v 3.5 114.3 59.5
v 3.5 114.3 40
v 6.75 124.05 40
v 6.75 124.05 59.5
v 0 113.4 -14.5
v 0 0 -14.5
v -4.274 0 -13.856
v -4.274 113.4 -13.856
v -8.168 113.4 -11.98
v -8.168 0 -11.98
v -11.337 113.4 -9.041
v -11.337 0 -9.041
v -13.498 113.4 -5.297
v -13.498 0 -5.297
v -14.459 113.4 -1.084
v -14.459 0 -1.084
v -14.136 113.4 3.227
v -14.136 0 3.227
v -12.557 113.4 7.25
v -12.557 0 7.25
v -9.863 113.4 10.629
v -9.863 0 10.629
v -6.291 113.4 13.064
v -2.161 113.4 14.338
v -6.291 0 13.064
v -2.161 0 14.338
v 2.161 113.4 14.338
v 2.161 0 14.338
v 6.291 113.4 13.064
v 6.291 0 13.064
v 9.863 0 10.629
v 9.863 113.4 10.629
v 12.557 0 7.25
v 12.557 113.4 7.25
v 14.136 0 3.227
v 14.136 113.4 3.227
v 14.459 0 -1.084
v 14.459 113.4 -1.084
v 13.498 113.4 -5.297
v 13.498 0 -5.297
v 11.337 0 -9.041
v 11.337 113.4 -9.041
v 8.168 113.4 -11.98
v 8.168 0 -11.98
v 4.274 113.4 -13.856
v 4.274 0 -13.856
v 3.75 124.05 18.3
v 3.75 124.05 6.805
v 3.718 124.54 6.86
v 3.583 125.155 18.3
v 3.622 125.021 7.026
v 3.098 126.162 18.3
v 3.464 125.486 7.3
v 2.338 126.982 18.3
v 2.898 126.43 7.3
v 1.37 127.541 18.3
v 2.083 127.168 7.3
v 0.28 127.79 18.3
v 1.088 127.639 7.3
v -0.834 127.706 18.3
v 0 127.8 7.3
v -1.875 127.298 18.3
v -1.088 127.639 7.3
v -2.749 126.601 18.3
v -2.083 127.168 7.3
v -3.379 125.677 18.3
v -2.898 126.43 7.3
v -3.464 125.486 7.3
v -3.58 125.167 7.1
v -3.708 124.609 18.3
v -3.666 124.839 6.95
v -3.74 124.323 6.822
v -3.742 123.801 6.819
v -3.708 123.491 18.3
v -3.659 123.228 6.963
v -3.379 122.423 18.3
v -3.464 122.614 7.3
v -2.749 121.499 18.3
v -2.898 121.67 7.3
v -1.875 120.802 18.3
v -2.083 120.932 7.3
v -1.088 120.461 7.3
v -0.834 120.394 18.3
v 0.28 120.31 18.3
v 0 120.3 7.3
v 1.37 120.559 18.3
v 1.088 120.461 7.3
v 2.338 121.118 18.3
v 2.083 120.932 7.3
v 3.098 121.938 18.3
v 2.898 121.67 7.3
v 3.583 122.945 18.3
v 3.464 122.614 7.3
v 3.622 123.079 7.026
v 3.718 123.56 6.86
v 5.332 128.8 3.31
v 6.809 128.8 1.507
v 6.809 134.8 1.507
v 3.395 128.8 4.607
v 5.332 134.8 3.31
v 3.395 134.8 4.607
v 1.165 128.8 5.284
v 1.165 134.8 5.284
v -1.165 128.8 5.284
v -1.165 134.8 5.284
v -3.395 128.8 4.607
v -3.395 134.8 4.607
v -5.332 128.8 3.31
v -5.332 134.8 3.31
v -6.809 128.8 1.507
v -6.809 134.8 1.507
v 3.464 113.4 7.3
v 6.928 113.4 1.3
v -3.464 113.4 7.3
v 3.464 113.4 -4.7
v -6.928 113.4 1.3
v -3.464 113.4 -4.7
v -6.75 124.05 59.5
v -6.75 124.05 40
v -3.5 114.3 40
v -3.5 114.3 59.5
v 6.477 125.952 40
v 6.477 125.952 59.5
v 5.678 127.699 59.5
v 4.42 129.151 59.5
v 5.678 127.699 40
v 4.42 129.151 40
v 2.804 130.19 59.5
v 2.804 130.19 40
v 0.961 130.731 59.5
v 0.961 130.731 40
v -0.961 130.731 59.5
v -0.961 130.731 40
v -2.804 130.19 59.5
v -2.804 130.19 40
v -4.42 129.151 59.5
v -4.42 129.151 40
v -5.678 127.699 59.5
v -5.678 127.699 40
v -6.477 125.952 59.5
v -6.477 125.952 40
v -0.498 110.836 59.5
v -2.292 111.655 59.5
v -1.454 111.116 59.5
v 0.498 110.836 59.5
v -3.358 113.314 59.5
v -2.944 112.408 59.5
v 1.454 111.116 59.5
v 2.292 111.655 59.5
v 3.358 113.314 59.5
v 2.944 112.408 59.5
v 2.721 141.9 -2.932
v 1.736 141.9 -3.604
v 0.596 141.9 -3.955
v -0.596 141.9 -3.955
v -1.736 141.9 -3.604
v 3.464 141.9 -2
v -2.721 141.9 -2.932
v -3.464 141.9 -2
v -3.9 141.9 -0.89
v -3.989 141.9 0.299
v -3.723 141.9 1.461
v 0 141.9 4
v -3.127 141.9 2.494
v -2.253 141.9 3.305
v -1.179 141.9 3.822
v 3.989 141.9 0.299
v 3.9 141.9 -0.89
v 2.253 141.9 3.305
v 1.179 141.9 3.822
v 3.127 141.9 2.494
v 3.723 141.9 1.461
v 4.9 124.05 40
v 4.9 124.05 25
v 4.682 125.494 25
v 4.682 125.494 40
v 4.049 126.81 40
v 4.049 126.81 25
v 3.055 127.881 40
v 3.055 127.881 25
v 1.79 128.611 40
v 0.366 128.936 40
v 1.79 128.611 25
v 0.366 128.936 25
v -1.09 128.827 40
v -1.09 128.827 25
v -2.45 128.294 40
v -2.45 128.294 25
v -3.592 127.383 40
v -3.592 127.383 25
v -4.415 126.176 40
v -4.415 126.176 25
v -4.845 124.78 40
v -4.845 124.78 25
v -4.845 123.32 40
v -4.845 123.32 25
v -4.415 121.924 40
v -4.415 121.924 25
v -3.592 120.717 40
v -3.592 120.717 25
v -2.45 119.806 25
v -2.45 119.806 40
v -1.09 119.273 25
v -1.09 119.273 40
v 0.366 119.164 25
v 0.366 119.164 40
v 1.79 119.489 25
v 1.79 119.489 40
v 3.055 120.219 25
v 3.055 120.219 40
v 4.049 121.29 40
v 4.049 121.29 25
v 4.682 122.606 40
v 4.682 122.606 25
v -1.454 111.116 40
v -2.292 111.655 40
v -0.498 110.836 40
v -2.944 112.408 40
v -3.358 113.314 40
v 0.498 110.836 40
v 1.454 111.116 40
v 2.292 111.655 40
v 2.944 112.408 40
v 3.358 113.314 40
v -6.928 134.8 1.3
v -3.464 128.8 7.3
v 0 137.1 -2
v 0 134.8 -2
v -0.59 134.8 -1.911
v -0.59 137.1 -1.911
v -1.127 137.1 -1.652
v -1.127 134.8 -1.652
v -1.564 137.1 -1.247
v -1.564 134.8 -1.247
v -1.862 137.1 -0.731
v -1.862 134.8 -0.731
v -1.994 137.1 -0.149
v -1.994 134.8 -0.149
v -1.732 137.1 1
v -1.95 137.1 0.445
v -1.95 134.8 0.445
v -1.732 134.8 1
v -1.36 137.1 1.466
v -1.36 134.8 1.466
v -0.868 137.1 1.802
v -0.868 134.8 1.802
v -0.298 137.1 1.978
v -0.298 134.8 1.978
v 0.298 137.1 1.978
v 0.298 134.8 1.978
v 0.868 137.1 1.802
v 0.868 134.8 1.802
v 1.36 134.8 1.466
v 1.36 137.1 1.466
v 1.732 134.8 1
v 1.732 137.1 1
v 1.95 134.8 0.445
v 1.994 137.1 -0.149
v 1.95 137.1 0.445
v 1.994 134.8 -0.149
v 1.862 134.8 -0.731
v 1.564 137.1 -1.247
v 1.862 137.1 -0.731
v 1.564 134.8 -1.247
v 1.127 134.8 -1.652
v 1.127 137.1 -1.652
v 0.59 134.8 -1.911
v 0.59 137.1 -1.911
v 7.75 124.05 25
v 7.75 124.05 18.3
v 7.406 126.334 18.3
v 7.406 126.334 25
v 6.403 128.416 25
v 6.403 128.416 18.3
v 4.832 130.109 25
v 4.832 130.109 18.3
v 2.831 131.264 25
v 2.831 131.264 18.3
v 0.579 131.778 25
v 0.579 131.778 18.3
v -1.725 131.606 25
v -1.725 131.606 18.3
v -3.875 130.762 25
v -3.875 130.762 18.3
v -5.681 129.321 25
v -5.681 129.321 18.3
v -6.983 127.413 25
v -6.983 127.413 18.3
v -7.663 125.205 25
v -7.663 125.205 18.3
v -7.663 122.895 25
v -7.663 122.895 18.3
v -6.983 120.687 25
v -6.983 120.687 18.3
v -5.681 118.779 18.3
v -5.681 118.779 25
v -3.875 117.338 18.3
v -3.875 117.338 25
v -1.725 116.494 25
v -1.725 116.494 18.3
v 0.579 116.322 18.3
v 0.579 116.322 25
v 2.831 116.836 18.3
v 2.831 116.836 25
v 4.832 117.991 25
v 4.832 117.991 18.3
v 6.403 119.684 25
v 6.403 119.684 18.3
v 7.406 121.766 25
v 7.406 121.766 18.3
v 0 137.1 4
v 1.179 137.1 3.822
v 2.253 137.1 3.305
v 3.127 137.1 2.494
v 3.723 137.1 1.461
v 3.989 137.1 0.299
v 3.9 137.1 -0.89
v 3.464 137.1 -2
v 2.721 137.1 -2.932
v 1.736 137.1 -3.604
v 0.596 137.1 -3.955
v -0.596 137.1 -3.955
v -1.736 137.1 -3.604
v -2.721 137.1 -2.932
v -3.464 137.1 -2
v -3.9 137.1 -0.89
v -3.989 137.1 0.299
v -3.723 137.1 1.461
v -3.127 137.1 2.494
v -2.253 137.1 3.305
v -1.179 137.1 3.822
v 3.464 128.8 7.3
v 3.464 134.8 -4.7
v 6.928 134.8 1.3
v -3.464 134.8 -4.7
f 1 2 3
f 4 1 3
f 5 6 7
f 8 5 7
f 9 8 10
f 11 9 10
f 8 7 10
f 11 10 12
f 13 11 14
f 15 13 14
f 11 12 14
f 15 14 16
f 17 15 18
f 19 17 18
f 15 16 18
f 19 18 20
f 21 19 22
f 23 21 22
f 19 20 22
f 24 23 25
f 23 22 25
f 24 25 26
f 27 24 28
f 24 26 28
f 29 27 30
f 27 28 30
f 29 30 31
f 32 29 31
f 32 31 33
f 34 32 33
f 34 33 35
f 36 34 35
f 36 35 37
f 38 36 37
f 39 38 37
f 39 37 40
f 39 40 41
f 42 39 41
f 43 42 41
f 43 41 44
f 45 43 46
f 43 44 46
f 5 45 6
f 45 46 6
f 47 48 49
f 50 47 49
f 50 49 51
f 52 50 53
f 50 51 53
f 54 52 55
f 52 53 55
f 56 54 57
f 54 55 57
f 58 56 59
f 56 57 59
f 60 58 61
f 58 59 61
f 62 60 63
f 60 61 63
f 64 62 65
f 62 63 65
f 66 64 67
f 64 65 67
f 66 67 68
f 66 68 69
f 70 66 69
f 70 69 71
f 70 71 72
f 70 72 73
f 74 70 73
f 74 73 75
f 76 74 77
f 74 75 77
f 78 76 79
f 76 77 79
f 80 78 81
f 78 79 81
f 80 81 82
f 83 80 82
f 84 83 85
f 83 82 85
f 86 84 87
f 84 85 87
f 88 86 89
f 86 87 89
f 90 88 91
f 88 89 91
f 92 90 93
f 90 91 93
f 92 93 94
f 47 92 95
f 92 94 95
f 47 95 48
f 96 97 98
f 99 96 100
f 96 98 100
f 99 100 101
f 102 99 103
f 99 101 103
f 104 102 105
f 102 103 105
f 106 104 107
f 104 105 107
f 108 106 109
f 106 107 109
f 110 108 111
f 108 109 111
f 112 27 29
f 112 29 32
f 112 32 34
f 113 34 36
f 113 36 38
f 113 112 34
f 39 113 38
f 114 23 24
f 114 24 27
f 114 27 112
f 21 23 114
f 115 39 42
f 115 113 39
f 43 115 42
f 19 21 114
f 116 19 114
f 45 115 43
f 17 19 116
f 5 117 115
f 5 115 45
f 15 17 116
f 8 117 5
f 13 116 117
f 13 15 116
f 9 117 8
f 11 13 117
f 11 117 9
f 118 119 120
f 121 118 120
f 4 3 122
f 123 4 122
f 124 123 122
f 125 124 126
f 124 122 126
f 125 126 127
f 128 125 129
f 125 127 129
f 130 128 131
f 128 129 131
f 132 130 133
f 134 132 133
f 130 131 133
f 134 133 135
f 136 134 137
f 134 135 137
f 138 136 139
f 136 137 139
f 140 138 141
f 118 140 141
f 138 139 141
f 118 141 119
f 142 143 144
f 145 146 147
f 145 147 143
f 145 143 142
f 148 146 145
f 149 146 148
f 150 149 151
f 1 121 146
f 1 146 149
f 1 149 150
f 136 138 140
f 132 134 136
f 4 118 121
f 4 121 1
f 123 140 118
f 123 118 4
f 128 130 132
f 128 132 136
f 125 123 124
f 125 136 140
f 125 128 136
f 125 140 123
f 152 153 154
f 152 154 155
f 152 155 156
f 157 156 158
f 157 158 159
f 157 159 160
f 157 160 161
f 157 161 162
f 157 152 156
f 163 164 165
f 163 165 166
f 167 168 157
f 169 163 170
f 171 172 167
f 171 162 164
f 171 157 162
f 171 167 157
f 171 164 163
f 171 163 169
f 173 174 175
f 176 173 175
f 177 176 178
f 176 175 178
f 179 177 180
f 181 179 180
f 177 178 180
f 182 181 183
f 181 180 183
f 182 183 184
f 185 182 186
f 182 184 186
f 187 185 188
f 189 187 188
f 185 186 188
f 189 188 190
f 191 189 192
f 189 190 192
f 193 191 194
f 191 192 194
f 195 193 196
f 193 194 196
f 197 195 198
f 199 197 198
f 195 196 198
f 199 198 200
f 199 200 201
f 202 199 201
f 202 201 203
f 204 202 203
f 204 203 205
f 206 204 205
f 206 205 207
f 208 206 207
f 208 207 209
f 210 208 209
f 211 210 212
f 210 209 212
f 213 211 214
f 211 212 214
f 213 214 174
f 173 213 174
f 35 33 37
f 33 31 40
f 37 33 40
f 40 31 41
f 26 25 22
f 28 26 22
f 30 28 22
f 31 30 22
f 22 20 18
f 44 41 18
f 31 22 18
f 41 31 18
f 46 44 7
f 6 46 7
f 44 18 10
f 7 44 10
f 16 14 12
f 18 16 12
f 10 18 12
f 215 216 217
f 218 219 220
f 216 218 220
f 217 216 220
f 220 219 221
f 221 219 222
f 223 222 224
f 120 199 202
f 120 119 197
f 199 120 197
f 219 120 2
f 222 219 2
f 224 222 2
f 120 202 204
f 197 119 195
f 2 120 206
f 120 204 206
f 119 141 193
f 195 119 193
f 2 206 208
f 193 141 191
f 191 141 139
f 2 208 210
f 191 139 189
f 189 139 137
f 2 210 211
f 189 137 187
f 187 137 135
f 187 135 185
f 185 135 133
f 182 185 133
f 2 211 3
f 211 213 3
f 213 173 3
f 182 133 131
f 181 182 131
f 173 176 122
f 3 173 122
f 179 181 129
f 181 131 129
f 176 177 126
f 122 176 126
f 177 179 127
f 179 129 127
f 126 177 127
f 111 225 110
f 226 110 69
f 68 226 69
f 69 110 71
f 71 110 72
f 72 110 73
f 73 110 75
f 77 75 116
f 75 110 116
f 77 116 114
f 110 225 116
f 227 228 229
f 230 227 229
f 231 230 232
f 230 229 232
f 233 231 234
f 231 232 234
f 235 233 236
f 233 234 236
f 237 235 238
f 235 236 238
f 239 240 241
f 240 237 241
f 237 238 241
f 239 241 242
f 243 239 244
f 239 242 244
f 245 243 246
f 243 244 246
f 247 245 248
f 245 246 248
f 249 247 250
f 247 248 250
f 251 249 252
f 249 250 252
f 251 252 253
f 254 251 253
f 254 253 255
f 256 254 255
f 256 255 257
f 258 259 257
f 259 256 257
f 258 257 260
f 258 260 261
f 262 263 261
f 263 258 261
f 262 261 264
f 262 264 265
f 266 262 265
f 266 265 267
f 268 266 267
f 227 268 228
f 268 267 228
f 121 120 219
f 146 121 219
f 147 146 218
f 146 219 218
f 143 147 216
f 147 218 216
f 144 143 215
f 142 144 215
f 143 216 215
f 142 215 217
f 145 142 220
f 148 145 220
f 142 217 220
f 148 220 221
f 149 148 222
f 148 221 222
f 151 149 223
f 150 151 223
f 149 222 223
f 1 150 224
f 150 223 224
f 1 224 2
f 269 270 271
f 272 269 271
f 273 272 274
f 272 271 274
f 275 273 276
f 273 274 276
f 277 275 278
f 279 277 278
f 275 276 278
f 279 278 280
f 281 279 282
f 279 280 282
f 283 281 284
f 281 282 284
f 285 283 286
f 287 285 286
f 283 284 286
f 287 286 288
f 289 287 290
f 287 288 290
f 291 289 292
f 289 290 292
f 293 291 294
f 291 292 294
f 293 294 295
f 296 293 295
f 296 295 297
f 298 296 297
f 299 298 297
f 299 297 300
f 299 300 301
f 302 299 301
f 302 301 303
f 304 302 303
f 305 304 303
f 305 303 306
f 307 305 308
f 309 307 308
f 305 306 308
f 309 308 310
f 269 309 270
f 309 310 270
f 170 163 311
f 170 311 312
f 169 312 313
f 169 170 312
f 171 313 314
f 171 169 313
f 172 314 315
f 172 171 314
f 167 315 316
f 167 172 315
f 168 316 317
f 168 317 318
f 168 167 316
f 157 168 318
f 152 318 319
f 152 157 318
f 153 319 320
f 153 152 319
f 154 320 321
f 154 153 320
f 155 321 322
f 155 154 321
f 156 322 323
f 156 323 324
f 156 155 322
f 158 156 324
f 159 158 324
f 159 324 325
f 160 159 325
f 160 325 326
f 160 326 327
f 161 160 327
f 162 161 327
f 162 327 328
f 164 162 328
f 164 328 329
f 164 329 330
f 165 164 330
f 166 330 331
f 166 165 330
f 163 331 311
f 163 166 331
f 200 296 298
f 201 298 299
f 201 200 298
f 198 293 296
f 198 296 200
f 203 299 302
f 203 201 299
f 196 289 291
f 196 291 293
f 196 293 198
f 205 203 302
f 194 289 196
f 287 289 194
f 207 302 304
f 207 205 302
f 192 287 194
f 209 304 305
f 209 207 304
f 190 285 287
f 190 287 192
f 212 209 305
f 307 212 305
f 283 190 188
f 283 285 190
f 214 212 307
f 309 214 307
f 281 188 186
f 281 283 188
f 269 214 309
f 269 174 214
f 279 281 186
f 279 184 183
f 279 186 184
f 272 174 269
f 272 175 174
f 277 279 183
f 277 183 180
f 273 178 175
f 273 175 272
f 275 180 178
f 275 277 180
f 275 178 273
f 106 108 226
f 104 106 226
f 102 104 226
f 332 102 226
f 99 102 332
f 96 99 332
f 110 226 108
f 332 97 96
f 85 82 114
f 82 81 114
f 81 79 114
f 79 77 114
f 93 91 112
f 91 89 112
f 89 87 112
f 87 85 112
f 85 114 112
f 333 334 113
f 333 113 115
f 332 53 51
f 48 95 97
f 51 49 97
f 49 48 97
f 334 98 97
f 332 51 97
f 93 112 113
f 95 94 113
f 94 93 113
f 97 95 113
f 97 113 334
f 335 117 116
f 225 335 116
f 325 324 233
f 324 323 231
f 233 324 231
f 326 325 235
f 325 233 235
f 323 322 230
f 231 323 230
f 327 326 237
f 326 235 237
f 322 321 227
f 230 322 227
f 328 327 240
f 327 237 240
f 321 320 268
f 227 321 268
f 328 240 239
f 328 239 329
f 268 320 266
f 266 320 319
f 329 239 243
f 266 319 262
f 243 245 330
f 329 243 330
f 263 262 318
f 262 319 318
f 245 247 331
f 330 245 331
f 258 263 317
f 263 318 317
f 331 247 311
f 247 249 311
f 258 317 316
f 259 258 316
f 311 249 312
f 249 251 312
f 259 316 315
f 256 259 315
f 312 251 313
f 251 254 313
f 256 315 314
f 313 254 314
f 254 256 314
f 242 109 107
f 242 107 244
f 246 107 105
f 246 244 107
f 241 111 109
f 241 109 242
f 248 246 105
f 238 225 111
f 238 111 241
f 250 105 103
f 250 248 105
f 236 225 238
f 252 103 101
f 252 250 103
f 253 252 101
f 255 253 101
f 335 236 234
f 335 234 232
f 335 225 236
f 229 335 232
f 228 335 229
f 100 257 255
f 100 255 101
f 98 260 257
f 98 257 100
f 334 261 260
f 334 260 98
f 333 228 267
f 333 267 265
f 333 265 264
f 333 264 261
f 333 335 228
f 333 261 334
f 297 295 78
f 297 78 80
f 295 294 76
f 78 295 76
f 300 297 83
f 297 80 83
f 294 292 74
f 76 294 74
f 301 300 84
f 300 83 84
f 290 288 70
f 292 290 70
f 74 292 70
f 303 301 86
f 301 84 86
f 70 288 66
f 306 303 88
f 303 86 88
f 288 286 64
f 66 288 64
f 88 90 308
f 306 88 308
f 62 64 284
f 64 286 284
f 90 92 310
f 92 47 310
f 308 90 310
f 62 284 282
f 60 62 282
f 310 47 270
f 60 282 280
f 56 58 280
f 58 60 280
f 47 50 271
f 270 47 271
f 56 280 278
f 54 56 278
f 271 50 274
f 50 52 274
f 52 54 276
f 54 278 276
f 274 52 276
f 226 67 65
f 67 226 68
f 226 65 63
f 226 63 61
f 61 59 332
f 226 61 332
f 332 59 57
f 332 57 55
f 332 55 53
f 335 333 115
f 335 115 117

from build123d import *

# Parameters (mm, degrees)
SKETCH1_R                = 14.5
BOSS_EXTRUDE1_DEPTH      = 113.4
SKETCH2_R                = 2
BOSS_EXTRUDE2_DEPTH      = 28.5
SKETCH3_R                = 4
BOSS_EXTRUDE3_DEPTH      = 4.8
BOSS_EXTRUDE4_DEPTH      = 21.4
CUT_EXTRUDE1_DEPTH       = 6
BOSS_EXTRUDE5_DEPTH      = 11
BOSS_EXTRUDE5_DEPTH_BACK = 2
SKETCH7_R                = 3.75
SKETCH8_R                = 7.75
BOSS_EXTRUDE6_DEPTH      = 6.7
SKETCH9_R                = 4.9
BOSS_EXTRUDE7_DEPTH      = 15
BOSS_EXTRUDE8_DEPTH      = 19.5


with BuildPart() as part:
    # Sketch1 → Boss-Extrude1 (new body)
    with BuildSketch(Plane(origin=(0, 0, 0), x_dir=(1, 0, 0), z_dir=(0, 1, 0))):
        with Locations(Location((0, 0, 0), (0, 0, 90))):
            Circle(SKETCH1_R)
    extrude(amount=BOSS_EXTRUDE1_DEPTH)

    # Sketch2 → Boss-Extrude2 (add)
    with BuildSketch(Plane(origin=(0, 113.4, 0), x_dir=(1, 0, 0), z_dir=(0, 1, 0))):
        with Locations(Location((0, 0, 0), (0, 0, 90))):
            Circle(SKETCH2_R)
    extrude(amount=BOSS_EXTRUDE2_DEPTH)

    # Sketch3 → Boss-Extrude3 (add)
    with BuildSketch(Plane(origin=(0, 141.9, 0), x_dir=(1, 0, 0), z_dir=(0, 1, 0))):
        with Locations(Location((0, 0, 0), (0, 0, 270))):
            Circle(SKETCH3_R)
    extrude(amount=-BOSS_EXTRUDE3_DEPTH)

    # Sketch4 → Boss-Extrude4 (add)
    with BuildSketch(Plane(origin=(0, 113.4, 0), x_dir=(1, 0, 0), z_dir=(0, 1, 0))):
        Polygon((3.464101615, 4.7), (-3.464101615, 4.7), (-6.92820323, -1.3), (-3.464101615, -7.3), (3.464101615, -7.3), (6.92820323, -1.3), align=None)
    extrude(amount=BOSS_EXTRUDE4_DEPTH)

    # Sketch6 → Cut-Extrude1 (cut)
    with BuildSketch(Plane(origin=(0, 134.8, 0), x_dir=(1, 0, 0), z_dir=(0, 1, 0))):
        with BuildLine():
            Line((-6.92820323, -1.3), (-6.92820323, -9.46576474))
            Line((-6.92820323, -9.46576474), (6.92820323, -9.46576474))
            Line((6.92820323, -9.46576474), (6.92820323, -1.3))
            ThreePointArc((6.92820323, -1.3), (0, -5.37), (-6.92820323, -1.3))
        make_face()
    extrude(amount=-CUT_EXTRUDE1_DEPTH, mode=Mode.SUBTRACT)

    # Sketch7 → Boss-Extrude5 (add, two sides: drawn at the far end of the back side and taken through both)
    with BuildSketch(Plane.XY.offset(7.3).offset(-BOSS_EXTRUDE5_DEPTH_BACK)):
        with Locations((0, 124.05)):
            Circle(SKETCH7_R)
    extrude(amount=BOSS_EXTRUDE5_DEPTH + BOSS_EXTRUDE5_DEPTH_BACK)

    # Sketch8 → Boss-Extrude6 (add)
    with BuildSketch(Plane.XY.offset(18.3)):
        with Locations((0, 124.05)):
            Circle(SKETCH8_R)
    extrude(amount=BOSS_EXTRUDE6_DEPTH)

    # Sketch9 → Boss-Extrude7 (add)
    with BuildSketch(Plane.XY.offset(25)):
        with Locations((0, 124.05)):
            Circle(SKETCH9_R)
    extrude(amount=BOSS_EXTRUDE7_DEPTH)

    # Sketch10 → Boss-Extrude8 (add)
    with BuildSketch(Plane.XY.offset(40)):
        with BuildLine():
            Line((-6.75, 124.05), (-3.5, 114.3))
            ThreePointArc((-3.5, 114.3), (0, 110.8), (3.5, 114.3))
            Line((3.5, 114.3), (6.75, 124.05))
            ThreePointArc((6.75, 124.05), (0, 130.8), (-6.75, 124.05))
        make_face()
    extrude(amount=BOSS_EXTRUDE8_DEPTH)


solid = part.part
